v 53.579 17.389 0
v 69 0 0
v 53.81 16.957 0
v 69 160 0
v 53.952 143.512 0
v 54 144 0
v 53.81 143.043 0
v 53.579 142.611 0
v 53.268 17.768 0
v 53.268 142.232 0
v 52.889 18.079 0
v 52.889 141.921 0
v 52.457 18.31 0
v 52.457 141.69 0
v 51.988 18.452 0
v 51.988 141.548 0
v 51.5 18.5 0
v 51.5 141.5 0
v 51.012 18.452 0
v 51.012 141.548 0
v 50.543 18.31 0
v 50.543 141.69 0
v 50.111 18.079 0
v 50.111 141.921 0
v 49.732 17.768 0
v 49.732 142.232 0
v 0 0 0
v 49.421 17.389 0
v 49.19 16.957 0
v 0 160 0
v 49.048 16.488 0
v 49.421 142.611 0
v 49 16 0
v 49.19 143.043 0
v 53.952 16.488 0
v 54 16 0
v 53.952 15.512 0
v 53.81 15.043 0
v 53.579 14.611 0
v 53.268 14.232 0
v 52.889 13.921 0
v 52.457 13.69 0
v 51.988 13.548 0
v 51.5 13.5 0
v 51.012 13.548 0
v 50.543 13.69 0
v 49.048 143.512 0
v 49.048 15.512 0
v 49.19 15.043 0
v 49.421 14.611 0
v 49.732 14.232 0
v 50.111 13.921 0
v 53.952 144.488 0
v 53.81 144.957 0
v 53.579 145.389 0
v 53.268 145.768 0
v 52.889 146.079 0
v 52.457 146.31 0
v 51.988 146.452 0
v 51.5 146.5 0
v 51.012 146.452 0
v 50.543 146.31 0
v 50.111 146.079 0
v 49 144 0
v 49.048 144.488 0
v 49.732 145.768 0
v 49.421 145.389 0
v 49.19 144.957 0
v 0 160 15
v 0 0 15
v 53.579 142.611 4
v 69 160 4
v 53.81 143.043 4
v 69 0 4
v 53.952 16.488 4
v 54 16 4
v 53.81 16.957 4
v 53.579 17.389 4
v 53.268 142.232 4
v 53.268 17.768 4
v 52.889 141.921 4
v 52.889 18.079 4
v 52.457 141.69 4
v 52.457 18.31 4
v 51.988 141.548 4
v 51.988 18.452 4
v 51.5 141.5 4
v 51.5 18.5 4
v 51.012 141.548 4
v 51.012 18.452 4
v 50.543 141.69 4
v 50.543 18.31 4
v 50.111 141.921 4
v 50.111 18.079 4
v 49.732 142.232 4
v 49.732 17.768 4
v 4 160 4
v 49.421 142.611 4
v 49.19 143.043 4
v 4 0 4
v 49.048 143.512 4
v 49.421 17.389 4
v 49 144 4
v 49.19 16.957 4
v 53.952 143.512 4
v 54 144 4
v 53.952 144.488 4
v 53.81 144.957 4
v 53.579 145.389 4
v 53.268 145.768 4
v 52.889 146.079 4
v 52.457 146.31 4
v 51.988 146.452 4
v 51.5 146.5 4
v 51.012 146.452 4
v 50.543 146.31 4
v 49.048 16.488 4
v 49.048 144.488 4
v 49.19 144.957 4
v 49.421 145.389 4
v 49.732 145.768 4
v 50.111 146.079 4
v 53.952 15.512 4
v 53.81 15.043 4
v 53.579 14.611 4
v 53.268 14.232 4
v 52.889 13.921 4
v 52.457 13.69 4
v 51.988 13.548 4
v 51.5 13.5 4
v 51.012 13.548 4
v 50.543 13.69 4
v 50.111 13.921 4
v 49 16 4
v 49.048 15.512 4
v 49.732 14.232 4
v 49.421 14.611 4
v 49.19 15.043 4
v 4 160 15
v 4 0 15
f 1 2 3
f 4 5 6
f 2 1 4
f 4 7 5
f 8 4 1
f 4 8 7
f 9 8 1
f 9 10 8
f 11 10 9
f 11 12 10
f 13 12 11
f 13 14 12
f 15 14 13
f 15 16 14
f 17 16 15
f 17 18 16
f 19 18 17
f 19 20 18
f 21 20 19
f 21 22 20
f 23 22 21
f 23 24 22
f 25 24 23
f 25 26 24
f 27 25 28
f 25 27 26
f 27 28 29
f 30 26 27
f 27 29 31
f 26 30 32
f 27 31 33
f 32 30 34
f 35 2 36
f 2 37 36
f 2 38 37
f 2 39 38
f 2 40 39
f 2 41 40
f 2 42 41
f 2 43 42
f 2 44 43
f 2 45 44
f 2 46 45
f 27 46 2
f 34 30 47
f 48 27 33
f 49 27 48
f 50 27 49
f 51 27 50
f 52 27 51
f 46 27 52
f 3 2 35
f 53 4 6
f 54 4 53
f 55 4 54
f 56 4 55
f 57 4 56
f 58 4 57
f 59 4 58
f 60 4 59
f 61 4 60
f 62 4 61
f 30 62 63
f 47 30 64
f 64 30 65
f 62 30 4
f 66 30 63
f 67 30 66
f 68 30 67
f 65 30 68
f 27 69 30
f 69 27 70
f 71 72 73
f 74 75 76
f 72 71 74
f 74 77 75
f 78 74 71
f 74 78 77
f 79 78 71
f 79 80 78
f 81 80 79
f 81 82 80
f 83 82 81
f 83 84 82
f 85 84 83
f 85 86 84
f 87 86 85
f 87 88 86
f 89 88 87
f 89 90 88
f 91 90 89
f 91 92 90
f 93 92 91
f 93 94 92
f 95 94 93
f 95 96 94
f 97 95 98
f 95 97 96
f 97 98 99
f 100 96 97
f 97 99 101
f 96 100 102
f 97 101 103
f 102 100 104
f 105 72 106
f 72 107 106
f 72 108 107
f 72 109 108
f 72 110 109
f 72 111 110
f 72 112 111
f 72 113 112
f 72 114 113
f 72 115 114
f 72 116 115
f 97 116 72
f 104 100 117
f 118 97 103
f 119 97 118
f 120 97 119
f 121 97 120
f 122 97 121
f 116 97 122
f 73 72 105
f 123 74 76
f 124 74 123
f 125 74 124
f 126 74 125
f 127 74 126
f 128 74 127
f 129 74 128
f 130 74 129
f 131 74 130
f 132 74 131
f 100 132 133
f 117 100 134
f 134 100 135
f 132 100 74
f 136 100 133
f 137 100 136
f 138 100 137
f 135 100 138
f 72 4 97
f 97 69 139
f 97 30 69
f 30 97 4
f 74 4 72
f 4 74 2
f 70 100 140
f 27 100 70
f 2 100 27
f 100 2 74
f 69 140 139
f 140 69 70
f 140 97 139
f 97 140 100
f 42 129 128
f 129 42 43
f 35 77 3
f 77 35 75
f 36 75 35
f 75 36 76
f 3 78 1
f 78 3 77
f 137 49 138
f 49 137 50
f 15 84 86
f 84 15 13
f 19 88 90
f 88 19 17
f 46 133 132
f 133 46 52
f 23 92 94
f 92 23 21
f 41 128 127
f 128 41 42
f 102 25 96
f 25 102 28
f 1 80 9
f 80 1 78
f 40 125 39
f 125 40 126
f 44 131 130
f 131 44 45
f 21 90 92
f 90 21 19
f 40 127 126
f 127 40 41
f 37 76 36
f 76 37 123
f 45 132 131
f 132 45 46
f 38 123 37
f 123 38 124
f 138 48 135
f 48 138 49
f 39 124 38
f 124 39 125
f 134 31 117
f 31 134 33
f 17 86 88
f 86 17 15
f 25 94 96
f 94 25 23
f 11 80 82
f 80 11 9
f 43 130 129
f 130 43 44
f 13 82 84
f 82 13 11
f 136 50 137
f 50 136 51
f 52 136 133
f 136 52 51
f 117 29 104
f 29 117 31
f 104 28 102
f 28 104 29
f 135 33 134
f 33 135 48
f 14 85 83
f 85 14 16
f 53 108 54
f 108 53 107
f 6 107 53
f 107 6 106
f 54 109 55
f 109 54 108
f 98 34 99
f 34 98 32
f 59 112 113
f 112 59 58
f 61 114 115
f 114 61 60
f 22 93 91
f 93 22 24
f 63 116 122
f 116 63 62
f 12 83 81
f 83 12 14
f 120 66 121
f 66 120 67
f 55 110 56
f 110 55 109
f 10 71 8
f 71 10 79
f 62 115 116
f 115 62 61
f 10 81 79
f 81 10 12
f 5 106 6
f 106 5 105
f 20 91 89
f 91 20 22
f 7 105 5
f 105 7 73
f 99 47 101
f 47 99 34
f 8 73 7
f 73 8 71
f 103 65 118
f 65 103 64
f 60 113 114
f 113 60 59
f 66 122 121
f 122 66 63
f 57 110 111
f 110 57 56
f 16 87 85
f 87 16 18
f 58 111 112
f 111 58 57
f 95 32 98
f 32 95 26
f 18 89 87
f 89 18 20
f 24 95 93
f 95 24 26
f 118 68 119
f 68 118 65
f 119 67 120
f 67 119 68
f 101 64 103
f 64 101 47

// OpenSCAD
$fa=6*1;
$fs=0.5*1;


// Jig lenght
length=160;

// Jig width
width=65;

// Lenghtwise (1) or widthwise (0) jig?
type = 0;

// Hole spacing from limit stop
space=45;

// Jig thickness
thick=4;

// Hole Diameter (in mm)
dia=5;

// Center hole distance
chd=128;

// Limit stop high
limit=15;

difference()
{
    union() {
    // build main plate
    linear_extrude(thick) 
    square([(thick+width),length]);

    if (type)
    {
    translate([0,0,0]) 
    linear_extrude(limit) square([width, thick]);
    }
    else
    {
    translate([0,0,0]) 
    linear_extrude(limit) square([thick, length]);
    }  
    }

    // Drill bottom hole
    translate ([(thick+space+(dia/2)),((length-chd)/2), 0])
    cylinder(h=thick*4, d=dia, center=true);


    // Drill top hole
    translate ([(thick+space+(dia/2)),(chd+(length-chd)/2), 0])
    cylinder(h=thick*4, d=dia, center=true);
}
